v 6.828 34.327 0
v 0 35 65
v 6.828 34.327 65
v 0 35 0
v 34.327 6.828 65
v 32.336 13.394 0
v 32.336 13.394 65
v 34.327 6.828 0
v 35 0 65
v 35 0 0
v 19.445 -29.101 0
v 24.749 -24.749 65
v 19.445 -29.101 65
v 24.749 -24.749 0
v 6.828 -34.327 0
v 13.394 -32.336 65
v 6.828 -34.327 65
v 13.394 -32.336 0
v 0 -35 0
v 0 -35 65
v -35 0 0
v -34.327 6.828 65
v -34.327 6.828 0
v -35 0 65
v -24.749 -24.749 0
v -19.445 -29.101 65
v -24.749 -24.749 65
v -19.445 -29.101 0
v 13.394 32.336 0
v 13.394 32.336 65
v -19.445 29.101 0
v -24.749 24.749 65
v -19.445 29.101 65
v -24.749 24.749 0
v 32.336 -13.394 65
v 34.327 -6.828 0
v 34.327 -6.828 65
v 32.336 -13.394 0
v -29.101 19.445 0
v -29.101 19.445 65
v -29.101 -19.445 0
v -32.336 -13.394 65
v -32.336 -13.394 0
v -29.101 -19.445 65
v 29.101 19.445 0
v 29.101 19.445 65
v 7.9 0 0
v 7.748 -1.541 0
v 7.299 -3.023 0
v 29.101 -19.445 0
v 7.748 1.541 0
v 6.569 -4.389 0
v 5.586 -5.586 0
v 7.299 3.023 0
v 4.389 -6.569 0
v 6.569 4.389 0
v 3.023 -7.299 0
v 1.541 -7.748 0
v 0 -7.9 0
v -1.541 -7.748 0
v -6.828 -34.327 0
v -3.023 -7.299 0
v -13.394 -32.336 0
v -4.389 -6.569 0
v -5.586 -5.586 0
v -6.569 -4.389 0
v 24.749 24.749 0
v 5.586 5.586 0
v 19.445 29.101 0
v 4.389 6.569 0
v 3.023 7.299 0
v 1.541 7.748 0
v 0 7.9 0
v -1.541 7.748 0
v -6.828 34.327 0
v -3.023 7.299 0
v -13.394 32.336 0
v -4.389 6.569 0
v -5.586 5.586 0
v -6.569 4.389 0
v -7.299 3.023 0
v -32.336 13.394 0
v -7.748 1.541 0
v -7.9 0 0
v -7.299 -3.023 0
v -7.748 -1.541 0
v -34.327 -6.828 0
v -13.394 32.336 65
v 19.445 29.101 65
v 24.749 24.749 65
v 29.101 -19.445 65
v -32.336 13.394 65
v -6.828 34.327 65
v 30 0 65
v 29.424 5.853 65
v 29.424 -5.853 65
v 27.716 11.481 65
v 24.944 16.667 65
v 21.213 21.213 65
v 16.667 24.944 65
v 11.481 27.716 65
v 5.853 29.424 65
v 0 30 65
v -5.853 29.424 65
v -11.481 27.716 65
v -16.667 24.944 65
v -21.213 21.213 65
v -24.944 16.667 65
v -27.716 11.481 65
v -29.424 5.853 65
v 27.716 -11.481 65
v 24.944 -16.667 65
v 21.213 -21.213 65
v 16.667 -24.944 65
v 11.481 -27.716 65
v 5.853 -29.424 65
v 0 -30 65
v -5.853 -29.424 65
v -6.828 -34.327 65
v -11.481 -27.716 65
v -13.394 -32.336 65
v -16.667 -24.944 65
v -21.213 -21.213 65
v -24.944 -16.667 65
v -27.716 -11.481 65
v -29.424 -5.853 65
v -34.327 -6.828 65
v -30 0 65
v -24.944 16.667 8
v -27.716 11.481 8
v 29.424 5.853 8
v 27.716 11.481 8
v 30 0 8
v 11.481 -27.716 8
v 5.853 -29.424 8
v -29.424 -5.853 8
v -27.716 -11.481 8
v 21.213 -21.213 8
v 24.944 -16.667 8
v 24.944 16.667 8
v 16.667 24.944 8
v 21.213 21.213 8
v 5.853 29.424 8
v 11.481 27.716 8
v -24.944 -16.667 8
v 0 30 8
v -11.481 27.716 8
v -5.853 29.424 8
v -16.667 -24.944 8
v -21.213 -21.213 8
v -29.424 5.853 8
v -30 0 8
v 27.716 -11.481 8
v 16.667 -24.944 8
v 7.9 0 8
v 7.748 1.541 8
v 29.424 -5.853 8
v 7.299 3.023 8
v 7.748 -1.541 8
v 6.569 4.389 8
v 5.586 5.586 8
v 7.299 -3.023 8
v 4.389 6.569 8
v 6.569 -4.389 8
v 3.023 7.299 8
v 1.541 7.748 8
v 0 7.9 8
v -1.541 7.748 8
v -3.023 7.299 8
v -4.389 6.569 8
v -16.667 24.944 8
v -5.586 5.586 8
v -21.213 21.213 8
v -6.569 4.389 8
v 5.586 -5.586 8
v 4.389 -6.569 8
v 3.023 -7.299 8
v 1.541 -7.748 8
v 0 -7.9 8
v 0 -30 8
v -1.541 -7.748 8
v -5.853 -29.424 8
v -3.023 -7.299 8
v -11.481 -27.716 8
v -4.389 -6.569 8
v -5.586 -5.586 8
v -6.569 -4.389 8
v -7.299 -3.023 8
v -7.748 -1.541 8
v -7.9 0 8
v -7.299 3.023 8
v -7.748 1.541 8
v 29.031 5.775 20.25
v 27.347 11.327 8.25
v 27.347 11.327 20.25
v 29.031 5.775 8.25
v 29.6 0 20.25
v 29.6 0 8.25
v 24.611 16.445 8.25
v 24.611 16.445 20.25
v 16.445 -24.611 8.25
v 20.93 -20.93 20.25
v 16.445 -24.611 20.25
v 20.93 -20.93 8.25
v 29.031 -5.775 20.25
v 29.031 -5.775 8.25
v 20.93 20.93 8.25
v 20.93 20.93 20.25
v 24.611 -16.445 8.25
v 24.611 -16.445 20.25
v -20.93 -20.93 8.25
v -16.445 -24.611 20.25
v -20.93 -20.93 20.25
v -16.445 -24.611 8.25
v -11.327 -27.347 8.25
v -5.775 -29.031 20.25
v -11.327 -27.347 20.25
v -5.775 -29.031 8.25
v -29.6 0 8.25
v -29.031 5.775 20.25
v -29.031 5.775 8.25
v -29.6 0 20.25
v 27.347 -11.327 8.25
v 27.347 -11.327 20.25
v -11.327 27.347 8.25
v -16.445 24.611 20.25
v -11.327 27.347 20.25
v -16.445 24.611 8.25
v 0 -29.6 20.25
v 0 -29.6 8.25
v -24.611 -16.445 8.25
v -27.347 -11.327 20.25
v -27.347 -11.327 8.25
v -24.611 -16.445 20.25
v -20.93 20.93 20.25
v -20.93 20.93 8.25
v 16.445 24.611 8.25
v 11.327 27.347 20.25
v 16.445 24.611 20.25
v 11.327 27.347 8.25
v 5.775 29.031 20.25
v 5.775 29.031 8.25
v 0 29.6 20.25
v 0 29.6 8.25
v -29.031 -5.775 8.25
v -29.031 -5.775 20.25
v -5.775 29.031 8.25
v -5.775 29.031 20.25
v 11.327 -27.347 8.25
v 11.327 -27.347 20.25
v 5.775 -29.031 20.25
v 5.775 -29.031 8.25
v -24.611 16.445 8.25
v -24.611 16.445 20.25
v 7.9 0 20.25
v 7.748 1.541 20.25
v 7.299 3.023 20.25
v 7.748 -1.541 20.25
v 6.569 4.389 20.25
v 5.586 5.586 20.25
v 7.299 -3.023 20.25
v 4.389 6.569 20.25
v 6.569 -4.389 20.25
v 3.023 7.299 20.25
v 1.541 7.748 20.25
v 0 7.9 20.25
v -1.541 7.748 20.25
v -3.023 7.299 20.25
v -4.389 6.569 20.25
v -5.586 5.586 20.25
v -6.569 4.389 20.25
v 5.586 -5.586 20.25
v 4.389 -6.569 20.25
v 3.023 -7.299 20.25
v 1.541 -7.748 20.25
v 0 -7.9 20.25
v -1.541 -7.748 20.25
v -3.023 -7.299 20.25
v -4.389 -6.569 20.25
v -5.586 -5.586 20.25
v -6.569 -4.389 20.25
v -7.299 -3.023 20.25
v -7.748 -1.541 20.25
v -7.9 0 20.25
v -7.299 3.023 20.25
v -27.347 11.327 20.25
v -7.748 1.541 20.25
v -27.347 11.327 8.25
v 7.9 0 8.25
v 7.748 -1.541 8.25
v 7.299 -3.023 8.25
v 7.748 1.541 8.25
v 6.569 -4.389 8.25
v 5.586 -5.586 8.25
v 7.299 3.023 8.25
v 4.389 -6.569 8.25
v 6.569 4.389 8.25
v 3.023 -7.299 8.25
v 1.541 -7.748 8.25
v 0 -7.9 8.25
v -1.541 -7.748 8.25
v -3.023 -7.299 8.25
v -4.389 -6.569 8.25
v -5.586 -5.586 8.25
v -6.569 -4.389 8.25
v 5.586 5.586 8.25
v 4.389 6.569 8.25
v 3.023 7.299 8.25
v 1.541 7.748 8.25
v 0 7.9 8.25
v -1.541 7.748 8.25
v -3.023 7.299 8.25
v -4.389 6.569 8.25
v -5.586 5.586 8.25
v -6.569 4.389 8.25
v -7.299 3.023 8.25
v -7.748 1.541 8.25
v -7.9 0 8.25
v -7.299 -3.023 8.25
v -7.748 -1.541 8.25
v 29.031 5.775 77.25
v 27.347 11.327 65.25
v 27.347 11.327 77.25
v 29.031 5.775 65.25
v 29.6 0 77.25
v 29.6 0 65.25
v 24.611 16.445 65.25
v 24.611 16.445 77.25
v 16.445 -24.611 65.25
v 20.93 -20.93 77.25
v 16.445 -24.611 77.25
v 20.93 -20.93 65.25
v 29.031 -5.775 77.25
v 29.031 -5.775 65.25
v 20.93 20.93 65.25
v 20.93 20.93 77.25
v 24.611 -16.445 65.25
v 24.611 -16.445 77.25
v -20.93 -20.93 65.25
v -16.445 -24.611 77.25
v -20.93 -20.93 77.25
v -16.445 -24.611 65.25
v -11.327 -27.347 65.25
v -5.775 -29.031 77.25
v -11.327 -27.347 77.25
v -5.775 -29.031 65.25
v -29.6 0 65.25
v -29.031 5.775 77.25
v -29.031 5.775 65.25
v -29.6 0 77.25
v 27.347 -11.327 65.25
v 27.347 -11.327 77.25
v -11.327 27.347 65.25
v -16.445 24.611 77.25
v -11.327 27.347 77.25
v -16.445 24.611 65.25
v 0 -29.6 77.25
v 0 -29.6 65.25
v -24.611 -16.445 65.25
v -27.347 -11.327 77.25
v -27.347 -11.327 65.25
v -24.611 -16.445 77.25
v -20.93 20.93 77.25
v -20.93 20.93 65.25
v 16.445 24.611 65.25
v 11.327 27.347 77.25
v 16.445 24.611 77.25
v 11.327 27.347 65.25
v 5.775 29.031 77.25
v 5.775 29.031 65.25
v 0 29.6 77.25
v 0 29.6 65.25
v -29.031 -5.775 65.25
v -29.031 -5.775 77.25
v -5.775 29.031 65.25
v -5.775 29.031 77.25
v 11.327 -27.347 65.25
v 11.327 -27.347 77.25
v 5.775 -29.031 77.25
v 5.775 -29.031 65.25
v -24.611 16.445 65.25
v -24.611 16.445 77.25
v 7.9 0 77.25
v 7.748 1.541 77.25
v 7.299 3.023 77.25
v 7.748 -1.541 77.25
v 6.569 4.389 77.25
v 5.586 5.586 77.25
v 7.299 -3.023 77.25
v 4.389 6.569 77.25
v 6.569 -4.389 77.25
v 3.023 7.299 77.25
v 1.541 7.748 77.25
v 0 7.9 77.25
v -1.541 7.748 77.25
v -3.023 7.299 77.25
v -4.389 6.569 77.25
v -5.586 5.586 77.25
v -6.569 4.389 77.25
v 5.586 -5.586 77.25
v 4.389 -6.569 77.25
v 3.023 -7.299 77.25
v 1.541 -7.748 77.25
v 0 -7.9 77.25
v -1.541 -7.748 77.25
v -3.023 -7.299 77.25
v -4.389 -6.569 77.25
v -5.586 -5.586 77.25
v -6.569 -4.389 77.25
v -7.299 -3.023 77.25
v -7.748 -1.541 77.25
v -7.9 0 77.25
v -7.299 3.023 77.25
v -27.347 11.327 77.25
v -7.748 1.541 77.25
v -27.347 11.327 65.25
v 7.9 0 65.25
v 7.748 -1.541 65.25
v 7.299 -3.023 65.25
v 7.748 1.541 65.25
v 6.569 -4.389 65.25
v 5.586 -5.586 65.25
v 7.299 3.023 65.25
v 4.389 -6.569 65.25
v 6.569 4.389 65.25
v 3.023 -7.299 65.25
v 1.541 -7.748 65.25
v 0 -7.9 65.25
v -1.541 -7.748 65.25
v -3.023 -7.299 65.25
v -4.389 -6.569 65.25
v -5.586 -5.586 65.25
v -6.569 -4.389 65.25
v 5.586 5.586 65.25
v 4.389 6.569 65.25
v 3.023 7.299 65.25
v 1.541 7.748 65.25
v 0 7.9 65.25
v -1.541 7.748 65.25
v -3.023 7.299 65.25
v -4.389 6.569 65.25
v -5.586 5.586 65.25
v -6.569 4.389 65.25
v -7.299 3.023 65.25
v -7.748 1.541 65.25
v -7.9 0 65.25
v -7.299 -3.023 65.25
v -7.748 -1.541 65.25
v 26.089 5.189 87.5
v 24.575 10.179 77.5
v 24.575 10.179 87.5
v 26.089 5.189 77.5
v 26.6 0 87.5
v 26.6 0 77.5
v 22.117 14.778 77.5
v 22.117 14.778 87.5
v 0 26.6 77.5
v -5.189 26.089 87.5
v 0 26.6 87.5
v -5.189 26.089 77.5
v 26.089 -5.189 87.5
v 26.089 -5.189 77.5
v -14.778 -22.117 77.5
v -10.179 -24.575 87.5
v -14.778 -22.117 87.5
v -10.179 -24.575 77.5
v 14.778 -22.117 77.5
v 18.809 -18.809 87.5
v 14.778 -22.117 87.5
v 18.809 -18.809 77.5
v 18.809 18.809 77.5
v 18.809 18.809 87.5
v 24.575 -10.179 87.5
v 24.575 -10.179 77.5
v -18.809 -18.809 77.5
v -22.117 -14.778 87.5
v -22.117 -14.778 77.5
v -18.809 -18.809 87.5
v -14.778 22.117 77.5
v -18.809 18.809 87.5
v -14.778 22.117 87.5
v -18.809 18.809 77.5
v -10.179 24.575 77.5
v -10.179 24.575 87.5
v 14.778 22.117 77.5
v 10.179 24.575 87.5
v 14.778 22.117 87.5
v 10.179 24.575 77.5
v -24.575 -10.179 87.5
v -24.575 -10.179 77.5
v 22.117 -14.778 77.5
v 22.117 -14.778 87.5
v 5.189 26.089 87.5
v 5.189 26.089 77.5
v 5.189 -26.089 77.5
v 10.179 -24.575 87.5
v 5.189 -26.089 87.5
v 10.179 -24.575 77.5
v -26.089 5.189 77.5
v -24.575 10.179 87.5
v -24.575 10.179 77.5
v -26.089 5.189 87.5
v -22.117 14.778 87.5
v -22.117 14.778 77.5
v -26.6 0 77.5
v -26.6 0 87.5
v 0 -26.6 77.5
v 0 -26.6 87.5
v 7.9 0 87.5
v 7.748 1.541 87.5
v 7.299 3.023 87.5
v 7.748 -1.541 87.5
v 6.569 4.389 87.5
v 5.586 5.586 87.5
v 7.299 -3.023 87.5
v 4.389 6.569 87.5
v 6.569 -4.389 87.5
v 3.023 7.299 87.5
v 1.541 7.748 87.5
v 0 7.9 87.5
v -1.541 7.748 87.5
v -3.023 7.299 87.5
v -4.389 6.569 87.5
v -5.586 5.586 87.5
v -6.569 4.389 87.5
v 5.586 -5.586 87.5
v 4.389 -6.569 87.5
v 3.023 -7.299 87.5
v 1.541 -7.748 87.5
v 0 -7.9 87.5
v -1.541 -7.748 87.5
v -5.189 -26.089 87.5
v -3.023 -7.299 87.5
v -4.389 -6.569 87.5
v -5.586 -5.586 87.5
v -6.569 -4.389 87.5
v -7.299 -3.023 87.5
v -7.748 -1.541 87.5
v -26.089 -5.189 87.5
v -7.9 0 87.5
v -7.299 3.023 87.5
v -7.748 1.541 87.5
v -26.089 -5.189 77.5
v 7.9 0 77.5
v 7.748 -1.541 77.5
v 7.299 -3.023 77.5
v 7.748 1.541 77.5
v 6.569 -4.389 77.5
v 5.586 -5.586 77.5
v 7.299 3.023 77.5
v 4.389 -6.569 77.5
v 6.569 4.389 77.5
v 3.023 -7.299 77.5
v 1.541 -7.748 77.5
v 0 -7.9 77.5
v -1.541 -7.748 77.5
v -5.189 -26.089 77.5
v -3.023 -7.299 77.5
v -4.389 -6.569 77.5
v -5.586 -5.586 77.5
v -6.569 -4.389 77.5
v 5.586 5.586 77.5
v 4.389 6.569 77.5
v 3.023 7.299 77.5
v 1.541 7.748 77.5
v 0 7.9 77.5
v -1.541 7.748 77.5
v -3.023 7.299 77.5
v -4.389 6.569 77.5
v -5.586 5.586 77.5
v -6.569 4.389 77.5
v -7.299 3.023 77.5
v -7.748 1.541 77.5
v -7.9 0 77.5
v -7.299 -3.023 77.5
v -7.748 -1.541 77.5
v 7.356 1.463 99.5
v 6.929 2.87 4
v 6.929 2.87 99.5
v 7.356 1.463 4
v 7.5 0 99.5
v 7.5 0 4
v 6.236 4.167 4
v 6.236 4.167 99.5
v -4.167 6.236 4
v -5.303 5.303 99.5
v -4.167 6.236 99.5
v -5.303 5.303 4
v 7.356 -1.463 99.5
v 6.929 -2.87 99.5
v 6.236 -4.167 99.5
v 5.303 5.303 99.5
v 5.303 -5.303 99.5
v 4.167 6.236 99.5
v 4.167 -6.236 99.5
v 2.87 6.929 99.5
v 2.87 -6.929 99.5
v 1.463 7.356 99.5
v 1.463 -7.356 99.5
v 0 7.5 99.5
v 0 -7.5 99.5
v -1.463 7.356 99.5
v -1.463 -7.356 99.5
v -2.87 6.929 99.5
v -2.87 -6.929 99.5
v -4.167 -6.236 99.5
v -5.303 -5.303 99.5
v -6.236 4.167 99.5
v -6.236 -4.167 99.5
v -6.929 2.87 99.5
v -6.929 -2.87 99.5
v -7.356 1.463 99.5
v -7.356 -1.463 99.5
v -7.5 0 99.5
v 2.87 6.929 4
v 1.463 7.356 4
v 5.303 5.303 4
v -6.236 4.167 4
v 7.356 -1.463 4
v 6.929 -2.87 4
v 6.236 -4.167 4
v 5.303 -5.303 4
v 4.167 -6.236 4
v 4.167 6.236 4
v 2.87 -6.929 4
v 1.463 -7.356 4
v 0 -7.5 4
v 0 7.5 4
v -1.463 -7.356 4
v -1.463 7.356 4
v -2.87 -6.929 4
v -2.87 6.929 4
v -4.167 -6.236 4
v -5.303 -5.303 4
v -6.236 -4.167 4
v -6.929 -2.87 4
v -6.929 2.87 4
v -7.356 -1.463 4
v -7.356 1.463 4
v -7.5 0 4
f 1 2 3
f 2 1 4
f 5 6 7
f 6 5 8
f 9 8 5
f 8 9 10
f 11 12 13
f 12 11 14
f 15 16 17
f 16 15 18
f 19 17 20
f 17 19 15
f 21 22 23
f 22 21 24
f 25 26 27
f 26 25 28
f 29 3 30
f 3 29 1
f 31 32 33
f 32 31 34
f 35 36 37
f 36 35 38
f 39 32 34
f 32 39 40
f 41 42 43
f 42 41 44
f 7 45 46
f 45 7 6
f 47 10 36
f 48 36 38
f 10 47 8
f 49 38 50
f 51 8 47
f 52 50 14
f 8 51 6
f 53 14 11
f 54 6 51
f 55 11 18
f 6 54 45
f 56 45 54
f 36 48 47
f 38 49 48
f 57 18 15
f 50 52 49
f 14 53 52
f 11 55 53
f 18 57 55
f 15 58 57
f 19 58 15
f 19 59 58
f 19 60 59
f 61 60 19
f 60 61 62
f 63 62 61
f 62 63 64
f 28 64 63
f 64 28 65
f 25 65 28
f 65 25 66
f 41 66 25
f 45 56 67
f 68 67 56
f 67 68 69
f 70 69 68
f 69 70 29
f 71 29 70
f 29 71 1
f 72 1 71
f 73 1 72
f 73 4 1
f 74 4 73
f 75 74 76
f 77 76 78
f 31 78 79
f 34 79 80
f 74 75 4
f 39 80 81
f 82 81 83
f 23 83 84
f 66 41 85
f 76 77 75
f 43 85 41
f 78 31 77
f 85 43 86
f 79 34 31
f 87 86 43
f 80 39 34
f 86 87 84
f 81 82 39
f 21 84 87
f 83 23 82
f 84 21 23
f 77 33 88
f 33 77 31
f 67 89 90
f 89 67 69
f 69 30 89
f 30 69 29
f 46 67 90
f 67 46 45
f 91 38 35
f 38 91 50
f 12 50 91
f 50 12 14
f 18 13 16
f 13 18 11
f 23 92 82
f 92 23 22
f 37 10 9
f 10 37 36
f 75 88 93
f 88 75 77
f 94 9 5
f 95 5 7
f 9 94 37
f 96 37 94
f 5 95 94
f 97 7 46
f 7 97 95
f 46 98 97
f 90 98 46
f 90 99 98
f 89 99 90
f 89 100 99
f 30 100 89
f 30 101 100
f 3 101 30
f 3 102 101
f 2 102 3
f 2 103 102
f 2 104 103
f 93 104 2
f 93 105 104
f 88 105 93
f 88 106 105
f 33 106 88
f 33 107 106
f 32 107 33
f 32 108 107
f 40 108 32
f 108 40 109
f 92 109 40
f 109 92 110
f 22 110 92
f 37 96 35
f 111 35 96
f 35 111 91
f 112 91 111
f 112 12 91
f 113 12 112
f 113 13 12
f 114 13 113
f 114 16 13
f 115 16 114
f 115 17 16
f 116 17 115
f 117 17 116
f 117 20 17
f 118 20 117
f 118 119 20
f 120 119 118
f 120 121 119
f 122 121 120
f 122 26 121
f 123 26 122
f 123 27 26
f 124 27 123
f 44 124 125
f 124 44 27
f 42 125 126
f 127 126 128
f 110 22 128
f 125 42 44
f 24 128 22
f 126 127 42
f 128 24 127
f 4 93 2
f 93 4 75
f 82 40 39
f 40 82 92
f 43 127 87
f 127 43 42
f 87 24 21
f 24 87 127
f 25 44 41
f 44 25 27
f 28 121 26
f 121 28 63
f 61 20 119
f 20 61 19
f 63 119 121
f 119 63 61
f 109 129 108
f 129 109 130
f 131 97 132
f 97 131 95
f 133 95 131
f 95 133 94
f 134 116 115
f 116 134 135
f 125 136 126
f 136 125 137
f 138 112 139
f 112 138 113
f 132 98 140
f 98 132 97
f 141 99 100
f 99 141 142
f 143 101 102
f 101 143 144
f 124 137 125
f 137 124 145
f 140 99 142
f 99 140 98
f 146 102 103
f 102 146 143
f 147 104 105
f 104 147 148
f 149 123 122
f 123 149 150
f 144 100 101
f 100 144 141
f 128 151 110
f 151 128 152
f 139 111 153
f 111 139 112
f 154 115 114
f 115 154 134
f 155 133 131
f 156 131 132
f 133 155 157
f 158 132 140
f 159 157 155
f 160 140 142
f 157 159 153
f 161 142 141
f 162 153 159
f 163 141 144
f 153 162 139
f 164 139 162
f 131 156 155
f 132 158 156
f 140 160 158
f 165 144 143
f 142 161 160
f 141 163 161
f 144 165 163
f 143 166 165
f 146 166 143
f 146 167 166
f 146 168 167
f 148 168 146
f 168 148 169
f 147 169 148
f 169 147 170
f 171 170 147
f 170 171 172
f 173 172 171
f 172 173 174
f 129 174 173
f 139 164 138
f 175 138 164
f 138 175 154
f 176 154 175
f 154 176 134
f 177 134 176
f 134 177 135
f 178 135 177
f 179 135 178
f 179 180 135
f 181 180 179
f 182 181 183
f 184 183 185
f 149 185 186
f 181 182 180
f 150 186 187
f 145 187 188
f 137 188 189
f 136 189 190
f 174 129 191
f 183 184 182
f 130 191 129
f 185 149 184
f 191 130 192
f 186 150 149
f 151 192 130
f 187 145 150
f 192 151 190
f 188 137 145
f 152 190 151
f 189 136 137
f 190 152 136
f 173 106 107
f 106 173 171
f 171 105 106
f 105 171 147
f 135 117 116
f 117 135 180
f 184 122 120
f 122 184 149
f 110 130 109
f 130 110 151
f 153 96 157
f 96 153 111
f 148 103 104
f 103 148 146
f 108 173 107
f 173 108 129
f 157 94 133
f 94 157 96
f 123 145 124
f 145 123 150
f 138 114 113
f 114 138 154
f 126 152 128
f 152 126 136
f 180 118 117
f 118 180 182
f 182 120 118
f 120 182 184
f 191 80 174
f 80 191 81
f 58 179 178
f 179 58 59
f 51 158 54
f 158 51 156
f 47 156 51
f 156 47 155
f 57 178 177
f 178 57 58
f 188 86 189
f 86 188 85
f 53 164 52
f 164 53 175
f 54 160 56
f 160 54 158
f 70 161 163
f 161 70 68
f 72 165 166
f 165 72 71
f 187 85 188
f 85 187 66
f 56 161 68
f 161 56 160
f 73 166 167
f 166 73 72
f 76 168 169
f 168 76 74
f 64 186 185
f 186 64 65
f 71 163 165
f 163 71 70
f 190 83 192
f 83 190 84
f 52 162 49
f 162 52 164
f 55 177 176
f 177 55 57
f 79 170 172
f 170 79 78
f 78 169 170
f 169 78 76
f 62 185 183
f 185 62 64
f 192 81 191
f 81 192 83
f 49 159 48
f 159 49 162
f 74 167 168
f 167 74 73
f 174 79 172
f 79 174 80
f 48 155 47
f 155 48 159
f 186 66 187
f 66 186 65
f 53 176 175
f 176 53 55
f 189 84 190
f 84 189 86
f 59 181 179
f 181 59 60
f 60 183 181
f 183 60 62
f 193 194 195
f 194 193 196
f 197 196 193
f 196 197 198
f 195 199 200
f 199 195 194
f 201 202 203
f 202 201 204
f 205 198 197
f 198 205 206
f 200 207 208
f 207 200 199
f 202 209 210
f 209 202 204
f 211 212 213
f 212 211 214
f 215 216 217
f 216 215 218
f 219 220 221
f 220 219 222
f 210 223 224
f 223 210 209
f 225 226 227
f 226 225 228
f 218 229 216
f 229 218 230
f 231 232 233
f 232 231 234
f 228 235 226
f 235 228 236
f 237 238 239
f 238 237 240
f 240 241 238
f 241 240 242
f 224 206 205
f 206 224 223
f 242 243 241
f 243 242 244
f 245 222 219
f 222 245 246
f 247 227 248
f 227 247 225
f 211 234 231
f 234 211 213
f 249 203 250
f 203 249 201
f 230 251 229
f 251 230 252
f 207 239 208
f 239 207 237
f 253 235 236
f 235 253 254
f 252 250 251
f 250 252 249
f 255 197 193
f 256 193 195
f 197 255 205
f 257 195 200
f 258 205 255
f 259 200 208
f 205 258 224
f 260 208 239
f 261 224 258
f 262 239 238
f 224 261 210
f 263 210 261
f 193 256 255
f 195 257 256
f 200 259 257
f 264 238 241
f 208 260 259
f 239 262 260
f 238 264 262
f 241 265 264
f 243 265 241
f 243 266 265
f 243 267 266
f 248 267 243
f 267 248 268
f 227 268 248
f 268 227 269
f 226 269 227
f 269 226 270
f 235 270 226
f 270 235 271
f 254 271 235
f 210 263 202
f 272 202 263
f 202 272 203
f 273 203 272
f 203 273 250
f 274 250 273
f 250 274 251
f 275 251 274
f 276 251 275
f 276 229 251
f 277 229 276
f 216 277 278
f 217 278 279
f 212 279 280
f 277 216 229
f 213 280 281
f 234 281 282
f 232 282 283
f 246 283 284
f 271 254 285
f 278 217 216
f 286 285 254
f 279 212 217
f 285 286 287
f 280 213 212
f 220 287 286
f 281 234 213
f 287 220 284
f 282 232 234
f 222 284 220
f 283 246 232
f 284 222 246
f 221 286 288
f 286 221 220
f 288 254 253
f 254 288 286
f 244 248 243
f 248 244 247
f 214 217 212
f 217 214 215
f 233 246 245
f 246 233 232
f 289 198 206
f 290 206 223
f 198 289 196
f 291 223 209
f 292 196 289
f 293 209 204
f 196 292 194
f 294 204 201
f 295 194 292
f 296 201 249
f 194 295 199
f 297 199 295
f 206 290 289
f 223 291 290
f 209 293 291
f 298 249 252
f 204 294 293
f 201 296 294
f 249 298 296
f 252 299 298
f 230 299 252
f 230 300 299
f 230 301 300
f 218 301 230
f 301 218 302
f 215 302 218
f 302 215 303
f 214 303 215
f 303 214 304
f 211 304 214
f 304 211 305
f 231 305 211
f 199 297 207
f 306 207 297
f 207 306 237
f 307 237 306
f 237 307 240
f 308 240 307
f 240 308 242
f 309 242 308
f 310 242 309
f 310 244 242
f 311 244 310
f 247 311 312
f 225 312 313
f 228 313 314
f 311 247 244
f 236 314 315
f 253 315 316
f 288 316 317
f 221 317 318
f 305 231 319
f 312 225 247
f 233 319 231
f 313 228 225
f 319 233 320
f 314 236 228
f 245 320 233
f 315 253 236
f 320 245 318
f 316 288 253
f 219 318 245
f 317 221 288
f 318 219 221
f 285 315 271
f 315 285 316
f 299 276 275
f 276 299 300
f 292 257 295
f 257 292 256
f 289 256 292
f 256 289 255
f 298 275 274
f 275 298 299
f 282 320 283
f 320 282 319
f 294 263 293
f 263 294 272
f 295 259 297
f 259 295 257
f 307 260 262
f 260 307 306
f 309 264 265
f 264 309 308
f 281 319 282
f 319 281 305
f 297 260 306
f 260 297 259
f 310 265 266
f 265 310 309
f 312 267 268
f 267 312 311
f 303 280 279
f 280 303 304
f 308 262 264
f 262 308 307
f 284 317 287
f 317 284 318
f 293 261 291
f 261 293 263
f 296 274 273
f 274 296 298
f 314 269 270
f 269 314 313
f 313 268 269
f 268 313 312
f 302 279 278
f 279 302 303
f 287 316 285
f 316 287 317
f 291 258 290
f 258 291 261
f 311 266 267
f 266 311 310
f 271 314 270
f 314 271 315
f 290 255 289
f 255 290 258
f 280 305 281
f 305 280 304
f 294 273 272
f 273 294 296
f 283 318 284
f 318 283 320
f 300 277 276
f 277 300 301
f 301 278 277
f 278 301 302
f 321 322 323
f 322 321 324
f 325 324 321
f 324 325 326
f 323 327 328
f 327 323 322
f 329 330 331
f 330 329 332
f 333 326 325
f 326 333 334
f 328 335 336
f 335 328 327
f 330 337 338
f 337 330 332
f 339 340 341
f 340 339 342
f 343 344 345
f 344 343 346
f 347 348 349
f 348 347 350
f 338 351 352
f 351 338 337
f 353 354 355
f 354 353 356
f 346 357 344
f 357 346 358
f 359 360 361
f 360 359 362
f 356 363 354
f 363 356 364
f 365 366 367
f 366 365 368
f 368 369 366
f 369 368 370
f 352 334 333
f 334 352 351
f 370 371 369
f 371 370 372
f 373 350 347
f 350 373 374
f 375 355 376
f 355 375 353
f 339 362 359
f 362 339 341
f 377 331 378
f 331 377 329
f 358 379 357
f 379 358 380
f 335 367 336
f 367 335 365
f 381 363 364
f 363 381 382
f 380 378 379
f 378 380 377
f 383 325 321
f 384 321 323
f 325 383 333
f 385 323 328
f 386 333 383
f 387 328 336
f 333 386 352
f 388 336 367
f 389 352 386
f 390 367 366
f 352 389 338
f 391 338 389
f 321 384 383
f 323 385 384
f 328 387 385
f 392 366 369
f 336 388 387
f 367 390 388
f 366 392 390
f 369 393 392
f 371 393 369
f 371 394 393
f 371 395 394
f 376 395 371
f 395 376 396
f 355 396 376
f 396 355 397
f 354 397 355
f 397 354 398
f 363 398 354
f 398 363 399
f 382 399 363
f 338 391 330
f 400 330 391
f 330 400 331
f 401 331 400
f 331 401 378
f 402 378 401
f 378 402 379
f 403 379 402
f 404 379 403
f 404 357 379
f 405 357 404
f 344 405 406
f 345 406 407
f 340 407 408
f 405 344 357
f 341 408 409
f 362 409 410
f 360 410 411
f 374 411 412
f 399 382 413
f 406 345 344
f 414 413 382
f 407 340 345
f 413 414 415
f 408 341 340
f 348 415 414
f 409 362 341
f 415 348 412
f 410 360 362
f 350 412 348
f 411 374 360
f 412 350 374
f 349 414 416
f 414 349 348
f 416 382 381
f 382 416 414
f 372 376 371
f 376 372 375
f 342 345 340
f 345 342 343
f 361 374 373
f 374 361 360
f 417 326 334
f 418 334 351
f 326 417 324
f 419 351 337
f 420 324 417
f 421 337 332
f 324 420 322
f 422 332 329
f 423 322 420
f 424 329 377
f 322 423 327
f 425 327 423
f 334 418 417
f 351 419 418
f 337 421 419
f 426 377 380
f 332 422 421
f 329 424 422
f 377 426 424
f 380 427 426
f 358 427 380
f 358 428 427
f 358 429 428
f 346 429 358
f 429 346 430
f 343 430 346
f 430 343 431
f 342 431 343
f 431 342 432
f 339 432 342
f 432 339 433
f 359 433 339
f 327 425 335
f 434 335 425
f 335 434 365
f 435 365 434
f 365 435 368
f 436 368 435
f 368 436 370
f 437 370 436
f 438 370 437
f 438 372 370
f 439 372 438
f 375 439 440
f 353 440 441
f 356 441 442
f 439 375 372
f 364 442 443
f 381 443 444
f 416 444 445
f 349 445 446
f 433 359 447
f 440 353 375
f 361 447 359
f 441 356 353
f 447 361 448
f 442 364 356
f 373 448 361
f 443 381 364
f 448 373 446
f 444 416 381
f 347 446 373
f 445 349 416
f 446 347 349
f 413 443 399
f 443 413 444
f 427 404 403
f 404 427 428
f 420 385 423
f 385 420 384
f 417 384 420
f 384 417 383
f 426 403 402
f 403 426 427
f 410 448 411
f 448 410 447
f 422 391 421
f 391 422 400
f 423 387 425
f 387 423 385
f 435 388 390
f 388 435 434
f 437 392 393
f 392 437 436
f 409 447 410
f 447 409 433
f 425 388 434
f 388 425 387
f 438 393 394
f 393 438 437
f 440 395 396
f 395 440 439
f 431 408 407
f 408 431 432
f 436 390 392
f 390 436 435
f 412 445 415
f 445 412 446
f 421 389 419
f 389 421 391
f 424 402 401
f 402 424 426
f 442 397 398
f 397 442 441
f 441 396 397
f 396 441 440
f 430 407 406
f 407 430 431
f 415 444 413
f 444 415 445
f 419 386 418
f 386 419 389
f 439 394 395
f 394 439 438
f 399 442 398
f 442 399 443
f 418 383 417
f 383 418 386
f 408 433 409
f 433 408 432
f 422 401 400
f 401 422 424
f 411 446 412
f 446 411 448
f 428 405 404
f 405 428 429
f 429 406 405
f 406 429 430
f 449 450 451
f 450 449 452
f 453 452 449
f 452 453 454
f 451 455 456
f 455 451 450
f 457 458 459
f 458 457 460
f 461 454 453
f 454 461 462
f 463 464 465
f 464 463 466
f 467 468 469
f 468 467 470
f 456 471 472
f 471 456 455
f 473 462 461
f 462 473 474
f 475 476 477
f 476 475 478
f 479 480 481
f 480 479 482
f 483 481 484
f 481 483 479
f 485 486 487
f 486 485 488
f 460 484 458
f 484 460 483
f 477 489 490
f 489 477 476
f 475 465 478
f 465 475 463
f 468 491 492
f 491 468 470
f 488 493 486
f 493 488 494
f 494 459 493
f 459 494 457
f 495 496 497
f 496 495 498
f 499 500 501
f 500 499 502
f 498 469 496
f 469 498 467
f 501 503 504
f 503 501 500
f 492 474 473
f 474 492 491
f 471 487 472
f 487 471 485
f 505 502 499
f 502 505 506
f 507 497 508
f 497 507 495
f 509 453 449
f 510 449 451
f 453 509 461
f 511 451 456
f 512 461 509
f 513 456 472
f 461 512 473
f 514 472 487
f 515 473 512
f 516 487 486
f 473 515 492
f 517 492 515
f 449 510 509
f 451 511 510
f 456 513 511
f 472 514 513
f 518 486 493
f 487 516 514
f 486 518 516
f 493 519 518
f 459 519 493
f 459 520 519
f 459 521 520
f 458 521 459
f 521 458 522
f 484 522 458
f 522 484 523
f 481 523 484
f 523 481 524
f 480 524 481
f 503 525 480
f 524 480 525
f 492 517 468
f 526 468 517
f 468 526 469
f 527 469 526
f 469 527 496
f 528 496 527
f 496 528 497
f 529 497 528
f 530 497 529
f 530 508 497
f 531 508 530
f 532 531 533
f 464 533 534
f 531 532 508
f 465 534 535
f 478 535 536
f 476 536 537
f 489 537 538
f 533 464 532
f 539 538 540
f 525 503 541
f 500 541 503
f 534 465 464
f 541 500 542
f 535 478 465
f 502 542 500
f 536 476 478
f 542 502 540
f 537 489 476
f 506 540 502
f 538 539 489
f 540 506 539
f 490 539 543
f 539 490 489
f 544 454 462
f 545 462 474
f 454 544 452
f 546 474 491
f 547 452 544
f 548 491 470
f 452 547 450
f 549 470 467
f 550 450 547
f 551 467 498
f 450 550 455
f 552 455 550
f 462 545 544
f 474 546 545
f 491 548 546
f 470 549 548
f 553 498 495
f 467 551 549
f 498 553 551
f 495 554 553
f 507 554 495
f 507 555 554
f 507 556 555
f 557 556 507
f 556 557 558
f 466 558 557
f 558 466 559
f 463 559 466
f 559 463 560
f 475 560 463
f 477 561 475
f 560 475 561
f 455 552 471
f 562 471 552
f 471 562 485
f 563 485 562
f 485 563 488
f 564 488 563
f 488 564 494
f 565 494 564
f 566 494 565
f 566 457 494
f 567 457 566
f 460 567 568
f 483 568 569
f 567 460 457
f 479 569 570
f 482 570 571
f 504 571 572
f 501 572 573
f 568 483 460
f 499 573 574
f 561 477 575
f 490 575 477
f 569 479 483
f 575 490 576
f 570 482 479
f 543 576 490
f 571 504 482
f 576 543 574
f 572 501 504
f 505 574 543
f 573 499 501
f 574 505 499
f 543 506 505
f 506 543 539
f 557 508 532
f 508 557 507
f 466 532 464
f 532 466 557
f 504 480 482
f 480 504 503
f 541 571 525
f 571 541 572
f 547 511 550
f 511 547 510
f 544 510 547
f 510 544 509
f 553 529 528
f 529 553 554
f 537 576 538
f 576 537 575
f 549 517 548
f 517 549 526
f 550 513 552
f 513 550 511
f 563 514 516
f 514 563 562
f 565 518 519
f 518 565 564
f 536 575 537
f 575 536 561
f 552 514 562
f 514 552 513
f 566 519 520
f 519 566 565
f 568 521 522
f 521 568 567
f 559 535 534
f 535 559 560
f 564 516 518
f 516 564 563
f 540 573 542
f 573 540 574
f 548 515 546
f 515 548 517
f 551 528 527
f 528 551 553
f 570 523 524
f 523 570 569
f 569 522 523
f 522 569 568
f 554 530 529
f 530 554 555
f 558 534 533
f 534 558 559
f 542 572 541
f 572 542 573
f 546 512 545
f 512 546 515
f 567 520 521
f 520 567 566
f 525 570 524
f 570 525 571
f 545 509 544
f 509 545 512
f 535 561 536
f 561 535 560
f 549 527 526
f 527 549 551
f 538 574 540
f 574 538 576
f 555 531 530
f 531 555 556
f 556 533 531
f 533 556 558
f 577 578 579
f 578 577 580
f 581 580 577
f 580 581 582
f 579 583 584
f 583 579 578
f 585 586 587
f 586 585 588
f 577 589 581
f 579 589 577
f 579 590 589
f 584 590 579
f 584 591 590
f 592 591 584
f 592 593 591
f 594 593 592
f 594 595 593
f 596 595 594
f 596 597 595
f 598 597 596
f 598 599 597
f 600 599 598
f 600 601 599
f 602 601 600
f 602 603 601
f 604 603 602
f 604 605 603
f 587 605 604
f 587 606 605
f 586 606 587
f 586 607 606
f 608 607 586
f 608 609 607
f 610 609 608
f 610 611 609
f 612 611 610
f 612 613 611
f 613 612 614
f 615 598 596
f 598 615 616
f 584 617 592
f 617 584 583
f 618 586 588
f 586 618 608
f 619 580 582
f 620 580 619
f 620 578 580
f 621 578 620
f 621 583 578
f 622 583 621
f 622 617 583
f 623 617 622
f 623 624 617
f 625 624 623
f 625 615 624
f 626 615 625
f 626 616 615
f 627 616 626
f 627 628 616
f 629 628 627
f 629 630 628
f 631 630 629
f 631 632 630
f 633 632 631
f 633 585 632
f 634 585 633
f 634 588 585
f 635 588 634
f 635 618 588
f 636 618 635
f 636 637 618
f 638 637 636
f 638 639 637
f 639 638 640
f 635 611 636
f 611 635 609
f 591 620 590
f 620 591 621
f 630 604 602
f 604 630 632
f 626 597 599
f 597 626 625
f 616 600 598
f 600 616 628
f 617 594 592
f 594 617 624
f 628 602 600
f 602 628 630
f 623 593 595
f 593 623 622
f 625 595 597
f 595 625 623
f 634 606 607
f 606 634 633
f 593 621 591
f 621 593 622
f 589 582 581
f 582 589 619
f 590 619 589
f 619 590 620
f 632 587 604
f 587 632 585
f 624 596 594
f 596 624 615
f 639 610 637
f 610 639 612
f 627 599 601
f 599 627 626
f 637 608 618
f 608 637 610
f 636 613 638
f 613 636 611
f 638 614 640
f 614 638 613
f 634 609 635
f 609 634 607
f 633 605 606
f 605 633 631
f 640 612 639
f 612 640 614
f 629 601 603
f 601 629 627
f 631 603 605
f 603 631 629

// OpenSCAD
$fn = 32;

// ------------------------------------------------------------------------
// Bearing housing: housing d70, two bearings and a shaft
// Every part is its own module, assembly() places them once.
// ------------------------------------------------------------------------

// --- part 1 ---
module housing() {
  difference() {
    cylinder(h = 65, d = 70);
    translate([0, 0, 8]) cylinder(h = 58, d = 60);
    translate([0, 0, -1]) cylinder(h = 10, d = 15.8);
  }
}

// --- part 2 ---
module bearing_lower() {
  difference() {
      translate([0, 0, 0]) cylinder(h = 12, d = 59.2);
      translate([0, 0, -1]) cylinder(h = 14, d = 15.8);
    }
}

// --- part 3 ---
module bearing_upper() {
  difference() {
      translate([0, 0, 0]) cylinder(h = 12, d = 59.2);
      translate([0, 0, -1]) cylinder(h = 14, d = 15.8);
    }
}

// --- part 4 ---
module spacer() {
  difference() {
      translate([0, 0, 0]) cylinder(h = 10, d = 53.2);
      translate([0, 0, -1]) cylinder(h = 12, d = 15.8);
    }
}

// --- part 5 ---
module shaft() {
  translate([0, 0, -47.75]) cylinder(h = 95.5, d = 15);
}

// --- assembly ---
module assembly() {
  translate([0, 0, 0]) rotate([0, 0, 0]) housing();
  translate([0, 0, 8.25]) rotate([0, 0, 0]) bearing_lower();
  translate([0, 0, 65.25]) rotate([0, 0, 0]) bearing_upper();
  translate([0, 0, 77.5]) rotate([0, 0, 0]) spacer();
  translate([0, 0, 51.75]) rotate([0, 0, 0]) shaft();
}

assembly();
